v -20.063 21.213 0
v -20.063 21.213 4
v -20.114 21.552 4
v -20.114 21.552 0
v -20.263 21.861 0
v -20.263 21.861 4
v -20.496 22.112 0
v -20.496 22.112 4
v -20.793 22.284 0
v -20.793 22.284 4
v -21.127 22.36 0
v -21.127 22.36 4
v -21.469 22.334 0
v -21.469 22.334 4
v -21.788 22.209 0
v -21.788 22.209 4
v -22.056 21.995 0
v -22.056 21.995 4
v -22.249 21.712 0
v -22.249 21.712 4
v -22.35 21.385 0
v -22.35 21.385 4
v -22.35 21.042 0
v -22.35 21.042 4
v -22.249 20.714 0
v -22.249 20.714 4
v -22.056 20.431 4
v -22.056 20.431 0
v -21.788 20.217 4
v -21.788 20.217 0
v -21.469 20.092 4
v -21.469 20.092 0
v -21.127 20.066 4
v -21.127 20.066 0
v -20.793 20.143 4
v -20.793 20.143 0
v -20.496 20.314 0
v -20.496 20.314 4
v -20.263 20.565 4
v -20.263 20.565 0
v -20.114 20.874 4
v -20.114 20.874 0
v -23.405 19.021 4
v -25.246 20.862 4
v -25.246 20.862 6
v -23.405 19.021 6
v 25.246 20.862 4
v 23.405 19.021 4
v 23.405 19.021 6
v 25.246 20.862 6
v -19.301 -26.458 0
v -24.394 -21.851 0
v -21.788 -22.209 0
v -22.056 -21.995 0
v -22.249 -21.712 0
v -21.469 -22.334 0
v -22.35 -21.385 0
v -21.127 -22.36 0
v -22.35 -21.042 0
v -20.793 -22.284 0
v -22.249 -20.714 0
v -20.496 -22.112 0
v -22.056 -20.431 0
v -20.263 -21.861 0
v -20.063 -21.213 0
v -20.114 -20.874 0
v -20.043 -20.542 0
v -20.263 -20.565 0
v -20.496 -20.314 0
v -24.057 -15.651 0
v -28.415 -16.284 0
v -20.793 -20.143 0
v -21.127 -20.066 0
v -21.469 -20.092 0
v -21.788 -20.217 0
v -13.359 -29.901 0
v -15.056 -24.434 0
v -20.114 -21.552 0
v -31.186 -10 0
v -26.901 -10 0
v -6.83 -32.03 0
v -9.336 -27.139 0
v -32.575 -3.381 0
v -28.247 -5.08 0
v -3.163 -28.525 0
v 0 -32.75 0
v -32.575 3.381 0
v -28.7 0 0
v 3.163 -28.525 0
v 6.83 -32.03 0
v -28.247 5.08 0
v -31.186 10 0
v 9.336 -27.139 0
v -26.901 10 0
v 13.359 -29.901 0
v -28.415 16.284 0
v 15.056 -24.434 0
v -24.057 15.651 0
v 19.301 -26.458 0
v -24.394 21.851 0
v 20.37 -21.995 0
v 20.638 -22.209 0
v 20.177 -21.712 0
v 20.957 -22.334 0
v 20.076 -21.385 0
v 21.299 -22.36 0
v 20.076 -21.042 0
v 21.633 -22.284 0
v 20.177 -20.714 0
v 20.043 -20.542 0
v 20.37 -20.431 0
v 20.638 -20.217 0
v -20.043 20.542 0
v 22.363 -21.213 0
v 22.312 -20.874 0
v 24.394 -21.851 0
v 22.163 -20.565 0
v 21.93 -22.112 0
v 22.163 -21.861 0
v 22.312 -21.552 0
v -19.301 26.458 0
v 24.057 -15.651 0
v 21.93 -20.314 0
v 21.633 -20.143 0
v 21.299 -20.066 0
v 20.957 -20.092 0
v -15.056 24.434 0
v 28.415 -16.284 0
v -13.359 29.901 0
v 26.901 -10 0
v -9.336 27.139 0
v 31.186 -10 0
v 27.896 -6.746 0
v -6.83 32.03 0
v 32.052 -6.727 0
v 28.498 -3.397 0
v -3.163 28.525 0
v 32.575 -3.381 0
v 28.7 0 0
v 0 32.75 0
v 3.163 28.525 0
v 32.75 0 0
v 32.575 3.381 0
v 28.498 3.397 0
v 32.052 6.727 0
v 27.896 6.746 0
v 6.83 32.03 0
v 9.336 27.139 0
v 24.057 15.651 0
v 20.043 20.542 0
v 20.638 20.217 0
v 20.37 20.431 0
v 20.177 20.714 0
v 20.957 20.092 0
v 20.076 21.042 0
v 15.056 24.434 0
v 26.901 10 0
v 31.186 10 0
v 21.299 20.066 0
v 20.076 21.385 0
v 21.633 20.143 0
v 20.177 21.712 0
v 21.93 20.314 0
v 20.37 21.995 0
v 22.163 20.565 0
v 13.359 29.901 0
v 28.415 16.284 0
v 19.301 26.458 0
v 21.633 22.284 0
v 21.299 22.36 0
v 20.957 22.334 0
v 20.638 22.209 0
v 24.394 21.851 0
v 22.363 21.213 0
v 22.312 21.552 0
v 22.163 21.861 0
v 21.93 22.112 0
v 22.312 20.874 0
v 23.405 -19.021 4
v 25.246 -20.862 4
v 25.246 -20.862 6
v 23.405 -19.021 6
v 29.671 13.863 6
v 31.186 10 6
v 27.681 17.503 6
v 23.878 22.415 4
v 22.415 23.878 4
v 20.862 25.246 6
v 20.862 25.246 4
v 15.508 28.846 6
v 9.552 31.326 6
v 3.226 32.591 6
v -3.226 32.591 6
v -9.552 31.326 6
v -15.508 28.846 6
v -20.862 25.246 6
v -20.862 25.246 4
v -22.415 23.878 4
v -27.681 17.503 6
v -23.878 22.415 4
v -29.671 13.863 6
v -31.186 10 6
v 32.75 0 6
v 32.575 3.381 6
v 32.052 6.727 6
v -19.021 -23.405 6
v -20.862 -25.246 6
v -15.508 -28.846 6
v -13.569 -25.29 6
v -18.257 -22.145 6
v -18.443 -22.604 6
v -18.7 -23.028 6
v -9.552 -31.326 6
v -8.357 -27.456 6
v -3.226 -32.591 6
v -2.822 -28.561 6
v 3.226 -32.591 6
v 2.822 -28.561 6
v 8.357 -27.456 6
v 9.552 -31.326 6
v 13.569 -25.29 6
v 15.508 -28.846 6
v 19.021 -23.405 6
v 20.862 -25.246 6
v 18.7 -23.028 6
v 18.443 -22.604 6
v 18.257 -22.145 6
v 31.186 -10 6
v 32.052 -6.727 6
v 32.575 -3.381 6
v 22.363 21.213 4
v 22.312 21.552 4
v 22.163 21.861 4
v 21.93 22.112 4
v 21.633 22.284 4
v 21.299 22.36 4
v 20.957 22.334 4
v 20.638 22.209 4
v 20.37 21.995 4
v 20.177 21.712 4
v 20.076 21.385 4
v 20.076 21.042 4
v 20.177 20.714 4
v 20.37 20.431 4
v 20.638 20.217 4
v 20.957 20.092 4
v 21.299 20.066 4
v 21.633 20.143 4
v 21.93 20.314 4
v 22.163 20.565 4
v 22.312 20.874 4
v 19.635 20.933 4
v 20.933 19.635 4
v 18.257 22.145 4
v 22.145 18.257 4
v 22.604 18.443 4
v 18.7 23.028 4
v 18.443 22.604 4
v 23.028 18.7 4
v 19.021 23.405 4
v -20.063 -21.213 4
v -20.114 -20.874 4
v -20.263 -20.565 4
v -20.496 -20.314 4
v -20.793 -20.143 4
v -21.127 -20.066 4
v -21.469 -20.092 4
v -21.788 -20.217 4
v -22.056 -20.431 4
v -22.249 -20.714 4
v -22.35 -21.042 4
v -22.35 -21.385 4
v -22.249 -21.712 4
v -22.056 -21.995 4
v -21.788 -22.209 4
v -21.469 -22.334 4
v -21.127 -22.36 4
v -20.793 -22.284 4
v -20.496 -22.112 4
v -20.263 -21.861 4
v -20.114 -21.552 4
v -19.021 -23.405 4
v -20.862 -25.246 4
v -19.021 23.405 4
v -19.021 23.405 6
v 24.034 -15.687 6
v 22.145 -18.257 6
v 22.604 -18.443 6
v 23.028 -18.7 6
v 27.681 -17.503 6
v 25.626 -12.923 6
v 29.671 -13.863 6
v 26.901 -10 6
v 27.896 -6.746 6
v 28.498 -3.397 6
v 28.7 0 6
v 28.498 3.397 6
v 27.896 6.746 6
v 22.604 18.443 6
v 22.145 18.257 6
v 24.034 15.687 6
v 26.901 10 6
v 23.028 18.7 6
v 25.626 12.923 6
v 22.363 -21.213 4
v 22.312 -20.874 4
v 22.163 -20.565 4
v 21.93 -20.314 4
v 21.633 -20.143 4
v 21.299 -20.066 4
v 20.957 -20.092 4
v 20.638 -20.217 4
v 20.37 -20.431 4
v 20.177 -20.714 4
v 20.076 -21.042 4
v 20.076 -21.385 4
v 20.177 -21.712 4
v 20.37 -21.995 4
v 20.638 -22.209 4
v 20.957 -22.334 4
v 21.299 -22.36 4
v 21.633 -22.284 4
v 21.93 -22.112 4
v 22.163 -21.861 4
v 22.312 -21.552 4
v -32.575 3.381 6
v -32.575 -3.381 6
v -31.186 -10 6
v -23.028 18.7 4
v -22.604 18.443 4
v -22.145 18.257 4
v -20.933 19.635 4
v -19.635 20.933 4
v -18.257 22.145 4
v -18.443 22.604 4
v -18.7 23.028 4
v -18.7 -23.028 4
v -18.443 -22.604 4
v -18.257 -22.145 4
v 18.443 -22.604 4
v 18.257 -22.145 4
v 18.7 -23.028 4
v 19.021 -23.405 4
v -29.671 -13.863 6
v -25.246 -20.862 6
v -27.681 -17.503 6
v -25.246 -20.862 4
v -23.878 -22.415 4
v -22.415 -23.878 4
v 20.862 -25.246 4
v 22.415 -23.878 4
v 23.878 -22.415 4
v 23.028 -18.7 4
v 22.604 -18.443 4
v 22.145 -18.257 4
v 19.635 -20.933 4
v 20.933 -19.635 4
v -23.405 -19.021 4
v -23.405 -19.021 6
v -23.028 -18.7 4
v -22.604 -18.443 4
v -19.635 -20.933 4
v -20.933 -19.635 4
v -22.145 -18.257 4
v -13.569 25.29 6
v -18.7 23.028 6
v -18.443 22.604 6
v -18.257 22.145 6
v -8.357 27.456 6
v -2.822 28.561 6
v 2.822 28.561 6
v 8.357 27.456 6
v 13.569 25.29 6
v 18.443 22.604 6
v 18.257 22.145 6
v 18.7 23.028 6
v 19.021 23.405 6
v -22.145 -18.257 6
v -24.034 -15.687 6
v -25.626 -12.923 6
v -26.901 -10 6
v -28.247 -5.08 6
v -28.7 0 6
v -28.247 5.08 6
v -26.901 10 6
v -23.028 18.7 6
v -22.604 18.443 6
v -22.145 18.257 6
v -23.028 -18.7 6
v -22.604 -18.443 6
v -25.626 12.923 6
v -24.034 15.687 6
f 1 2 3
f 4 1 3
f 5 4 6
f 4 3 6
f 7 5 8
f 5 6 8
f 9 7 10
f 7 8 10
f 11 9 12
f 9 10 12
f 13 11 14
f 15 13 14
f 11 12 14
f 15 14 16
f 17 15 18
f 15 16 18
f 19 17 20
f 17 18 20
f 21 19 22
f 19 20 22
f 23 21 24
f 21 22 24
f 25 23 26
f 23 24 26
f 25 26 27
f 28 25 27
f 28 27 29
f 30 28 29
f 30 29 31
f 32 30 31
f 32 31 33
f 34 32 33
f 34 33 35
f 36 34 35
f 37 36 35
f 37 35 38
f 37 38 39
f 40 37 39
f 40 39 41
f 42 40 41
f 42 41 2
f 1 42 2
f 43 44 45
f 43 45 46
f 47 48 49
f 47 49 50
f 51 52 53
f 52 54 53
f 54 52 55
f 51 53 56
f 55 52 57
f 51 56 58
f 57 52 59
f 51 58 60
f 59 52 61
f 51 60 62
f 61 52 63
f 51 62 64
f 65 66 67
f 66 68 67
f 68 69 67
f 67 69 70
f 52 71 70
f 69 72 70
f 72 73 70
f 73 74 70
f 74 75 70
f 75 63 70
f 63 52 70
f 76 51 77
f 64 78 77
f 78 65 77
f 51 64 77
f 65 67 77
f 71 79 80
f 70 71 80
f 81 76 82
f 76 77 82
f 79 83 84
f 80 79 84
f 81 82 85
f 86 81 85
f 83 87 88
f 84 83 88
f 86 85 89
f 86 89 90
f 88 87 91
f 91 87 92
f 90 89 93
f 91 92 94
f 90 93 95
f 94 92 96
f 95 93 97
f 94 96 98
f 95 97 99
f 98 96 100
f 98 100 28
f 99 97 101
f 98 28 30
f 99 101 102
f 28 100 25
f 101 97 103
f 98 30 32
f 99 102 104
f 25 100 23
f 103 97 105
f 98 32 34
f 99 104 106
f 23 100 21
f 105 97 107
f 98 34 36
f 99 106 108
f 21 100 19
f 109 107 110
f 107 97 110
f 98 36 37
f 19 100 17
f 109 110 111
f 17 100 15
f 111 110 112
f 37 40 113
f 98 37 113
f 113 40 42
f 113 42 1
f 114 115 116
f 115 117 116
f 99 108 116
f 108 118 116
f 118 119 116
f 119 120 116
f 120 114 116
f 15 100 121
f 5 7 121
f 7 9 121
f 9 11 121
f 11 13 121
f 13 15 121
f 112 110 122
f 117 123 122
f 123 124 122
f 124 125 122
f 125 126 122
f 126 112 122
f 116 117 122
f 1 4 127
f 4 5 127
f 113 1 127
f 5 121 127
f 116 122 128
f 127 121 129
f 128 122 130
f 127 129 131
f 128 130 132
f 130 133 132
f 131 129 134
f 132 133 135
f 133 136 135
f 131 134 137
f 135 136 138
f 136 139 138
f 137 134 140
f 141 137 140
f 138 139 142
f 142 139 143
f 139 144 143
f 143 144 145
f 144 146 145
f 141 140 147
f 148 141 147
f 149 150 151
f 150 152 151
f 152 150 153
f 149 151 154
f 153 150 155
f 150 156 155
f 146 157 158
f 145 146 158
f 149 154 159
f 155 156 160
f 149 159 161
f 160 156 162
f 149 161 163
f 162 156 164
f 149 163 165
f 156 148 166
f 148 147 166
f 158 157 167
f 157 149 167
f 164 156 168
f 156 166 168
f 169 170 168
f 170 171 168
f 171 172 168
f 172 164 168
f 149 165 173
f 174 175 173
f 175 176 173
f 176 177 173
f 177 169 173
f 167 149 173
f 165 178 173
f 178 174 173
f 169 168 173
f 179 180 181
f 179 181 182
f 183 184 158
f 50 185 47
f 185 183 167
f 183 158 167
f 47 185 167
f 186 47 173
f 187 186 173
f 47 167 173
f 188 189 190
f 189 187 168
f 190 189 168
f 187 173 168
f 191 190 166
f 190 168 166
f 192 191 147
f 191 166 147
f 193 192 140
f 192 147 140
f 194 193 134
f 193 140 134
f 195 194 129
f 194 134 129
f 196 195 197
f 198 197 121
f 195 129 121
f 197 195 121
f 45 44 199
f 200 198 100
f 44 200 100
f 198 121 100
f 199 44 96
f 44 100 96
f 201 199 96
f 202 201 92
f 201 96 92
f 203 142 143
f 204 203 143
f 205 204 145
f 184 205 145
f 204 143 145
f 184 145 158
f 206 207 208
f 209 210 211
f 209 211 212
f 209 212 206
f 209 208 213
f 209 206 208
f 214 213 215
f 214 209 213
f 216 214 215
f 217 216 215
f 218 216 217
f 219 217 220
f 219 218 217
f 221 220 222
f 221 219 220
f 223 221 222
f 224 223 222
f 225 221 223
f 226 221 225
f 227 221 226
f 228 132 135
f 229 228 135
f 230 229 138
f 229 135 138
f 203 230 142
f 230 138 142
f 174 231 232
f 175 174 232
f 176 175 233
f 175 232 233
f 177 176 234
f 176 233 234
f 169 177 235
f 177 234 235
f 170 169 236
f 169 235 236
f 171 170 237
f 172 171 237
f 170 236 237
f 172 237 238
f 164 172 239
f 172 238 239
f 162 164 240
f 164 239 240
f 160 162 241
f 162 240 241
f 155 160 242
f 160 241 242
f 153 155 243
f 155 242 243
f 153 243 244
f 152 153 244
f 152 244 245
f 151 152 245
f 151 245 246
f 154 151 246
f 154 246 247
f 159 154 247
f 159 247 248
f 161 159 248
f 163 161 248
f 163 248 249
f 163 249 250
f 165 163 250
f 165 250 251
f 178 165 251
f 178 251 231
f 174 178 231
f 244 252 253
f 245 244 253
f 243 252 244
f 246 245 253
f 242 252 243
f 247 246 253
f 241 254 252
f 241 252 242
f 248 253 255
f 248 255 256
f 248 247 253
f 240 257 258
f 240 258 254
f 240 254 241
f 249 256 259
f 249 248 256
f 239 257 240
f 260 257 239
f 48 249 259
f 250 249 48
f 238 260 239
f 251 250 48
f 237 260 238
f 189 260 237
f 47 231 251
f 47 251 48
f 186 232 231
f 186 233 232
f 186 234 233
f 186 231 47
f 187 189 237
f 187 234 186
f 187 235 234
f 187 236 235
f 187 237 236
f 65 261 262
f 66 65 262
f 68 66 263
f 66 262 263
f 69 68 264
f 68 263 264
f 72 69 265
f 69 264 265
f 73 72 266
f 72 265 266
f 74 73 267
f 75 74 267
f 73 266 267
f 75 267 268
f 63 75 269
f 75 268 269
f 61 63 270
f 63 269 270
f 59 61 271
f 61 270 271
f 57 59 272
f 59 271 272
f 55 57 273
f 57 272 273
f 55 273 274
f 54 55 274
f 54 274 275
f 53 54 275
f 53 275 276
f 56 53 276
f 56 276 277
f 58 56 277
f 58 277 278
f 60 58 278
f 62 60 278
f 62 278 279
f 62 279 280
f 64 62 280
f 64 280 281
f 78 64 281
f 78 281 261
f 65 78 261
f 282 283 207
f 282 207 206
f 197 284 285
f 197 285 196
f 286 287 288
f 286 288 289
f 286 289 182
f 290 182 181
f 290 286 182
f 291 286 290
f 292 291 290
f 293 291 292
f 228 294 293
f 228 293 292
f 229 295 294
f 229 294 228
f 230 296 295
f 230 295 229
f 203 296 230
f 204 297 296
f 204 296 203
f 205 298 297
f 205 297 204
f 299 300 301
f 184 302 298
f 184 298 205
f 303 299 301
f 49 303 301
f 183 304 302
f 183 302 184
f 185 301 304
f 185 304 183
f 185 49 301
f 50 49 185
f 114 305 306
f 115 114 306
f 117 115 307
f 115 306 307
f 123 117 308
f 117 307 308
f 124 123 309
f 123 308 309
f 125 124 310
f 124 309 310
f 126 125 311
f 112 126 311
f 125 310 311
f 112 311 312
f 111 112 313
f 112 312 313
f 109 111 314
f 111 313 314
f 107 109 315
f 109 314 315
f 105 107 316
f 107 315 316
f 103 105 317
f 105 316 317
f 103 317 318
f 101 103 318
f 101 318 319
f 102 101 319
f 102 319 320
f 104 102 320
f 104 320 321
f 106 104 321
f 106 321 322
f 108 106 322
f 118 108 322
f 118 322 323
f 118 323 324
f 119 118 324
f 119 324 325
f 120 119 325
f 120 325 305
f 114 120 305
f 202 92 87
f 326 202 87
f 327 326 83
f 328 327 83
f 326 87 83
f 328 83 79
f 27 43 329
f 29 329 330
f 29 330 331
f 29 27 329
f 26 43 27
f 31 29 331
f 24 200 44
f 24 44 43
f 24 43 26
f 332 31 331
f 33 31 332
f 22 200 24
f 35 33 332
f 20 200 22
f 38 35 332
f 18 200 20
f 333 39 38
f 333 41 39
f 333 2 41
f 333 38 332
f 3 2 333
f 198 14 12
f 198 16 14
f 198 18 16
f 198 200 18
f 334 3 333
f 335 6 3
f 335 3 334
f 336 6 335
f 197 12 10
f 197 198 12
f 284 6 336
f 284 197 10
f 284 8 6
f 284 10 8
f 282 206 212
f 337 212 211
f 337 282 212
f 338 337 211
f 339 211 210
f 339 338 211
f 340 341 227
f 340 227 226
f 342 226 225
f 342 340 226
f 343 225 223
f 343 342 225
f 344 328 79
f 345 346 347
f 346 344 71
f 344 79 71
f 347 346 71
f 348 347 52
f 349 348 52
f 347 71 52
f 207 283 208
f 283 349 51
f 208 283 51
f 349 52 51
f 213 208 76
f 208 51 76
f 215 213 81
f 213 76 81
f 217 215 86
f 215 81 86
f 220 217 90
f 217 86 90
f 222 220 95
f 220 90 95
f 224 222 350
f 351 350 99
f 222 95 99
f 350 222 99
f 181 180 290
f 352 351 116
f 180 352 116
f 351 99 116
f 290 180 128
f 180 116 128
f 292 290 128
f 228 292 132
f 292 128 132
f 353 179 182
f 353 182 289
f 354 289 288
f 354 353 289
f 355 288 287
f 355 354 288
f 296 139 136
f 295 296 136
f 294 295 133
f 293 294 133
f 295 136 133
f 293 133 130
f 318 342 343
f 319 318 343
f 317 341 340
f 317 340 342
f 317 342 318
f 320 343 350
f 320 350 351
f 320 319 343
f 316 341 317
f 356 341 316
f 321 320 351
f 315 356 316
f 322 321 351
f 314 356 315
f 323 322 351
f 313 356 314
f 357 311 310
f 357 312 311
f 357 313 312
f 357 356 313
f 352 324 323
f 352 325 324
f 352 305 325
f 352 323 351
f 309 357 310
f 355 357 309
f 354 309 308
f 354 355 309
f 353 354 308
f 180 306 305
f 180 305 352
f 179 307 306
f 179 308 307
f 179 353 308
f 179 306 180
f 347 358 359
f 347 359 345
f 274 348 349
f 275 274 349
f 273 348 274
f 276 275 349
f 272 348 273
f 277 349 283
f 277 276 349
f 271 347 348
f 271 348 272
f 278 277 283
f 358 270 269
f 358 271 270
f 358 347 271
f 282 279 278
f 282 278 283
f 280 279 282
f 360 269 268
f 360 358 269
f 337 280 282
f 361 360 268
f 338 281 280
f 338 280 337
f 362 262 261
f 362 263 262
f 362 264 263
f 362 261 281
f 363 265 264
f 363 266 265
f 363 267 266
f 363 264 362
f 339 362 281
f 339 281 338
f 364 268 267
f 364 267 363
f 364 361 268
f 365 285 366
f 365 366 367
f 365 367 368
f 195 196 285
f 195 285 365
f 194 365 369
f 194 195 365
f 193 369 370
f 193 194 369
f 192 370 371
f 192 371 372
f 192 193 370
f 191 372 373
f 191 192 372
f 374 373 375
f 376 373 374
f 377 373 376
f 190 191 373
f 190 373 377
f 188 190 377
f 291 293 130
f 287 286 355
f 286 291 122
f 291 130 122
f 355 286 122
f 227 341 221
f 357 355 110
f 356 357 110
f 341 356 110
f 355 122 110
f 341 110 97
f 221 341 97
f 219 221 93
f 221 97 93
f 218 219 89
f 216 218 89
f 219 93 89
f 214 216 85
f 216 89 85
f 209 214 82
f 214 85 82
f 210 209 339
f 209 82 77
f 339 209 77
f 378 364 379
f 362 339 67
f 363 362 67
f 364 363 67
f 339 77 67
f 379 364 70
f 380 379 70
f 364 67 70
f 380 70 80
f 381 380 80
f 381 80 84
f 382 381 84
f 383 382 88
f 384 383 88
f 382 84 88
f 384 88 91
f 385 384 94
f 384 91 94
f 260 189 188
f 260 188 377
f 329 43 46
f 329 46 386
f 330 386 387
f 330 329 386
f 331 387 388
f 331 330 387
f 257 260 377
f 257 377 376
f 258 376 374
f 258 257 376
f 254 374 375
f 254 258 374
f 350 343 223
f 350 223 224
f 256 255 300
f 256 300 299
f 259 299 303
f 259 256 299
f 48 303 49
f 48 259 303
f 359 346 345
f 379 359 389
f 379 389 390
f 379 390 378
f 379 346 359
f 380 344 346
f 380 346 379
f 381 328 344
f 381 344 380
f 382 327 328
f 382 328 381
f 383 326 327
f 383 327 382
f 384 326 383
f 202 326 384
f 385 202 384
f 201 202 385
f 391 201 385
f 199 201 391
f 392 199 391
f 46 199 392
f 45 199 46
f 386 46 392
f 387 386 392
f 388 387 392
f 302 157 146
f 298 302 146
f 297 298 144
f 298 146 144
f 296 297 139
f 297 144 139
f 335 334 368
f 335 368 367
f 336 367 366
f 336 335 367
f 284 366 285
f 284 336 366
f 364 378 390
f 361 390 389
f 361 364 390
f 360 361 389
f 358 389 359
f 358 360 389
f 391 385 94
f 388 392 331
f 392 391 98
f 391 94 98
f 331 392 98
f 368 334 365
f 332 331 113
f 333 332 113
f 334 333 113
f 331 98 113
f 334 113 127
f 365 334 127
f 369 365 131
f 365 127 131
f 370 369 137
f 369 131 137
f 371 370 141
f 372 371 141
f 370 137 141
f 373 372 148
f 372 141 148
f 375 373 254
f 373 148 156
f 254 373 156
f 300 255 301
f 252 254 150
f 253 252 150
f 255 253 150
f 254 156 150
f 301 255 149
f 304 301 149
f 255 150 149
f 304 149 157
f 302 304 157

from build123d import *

# Parameters (mm, degrees)
SKETCH1_R           = 32.75
SKETCH1_R_2         = 28.7
BOSS_EXTRUDE1_DEPTH = 6
CUT_EXTRUDE1_START  = -2
CUT_EXTRUDE1_DEPTH  = 4
SKETCH2_7_R         = 1.150000003
CUT_EXTRUDE3_DEPTH  = 10


with BuildPart() as part:
    # Sketch1 → Boss-Extrude1 (new body)
    with BuildSketch(Plane.XY):
        Circle(SKETCH1_R)
        Circle(SKETCH1_R_2, mode=Mode.SUBTRACT)
    extrude(amount=BOSS_EXTRUDE1_DEPTH)

    # Sketch2 → Cut-Extrude1 (cut)
    with BuildSketch(Plane.XY.offset(6).offset(CUT_EXTRUDE1_START)):
        with BuildLine():
            ThreePointArc((-20.861737651, 25.245799694), (-23.157747084, 23.157747084), (-25.245799694, 20.861737651))
            Line((-25.245799694, 20.861737651), (-23.40529254, 19.021230496))
            ThreePointArc((-23.40529254, 19.021230496), (-22.471587987, 18.380133477), (-21.369913272, 18.117222076))
            Line((-21.369913272, 18.117222076), (-21.855038092, 18.602346895))
            ThreePointArc((-21.855038092, 18.602346895), (-21.70970764, 18.771749897), (-21.563064144, 18.940017548))
            ThreePointArc((-21.563064144, 18.940017548), (-19.586915918, 19.586915918), (-18.940017548, 21.563064144))
            ThreePointArc((-18.940017548, 21.563064144), (-18.771749897, 21.70970764), (-18.602346895, 21.855038092))
            Line((-18.602346895, 21.855038092), (-18.117222076, 21.369913272))
            ThreePointArc((-18.117222076, 21.369913272), (-18.380133477, 22.471587987), (-19.021230496, 23.40529254))
            Line((-19.021230496, 23.40529254), (-20.861737651, 25.245799694))
        make_face()
        with BuildLine():
            Line((20.861737651, 25.245799694), (19.021230496, 23.40529254))
            ThreePointArc((19.0212305, 23.405292536), (18.380133483, 22.471587987), (18.117222082, 21.369913278))
            Line((18.117222082, 21.369913278), (18.602346895, 21.855038092))
            ThreePointArc((18.602346895, 21.855038092), (18.771749898, 21.709707639), (18.940017551, 21.563064142))
            ThreePointArc((18.940017551, 21.563064142), (19.58691592, 19.58691592), (21.563064142, 18.940017551))
            ThreePointArc((21.563064142, 18.940017551), (21.709707639, 18.771749898), (21.855038092, 18.602346895))
            Line((21.855038092, 18.602346895), (21.369913278, 18.117222082))
            ThreePointArc((21.369913278, 18.117222082), (22.471587987, 18.380133483), (23.405292536, 19.0212305))
            Line((23.40529254, 19.021230496), (25.245799694, 20.861737651))
            ThreePointArc((25.245799694, 20.861737651), (23.157747084, 23.157747084), (20.861737651, 25.245799694))
        make_face()
        with BuildLine():
            Line((-23.40529254, -19.021230496), (-25.245799694, -20.861737651))
            ThreePointArc((-25.245799694, -20.861737651), (-23.157747084, -23.157747084), (-20.861737651, -25.245799694))
            Line((-20.861737651, -25.245799694), (-19.021230496, -23.40529254))
            ThreePointArc((-19.021230492, -23.405292544), (-18.38013347, -22.471587986), (-18.11722207, -21.369913266))
            Line((-18.11722207, -21.369913266), (-18.602346895, -21.855038092))
            ThreePointArc((-18.602346895, -21.855038092), (-18.771749899, -21.709707638), (-18.940017553, -21.56306414))
            ThreePointArc((-18.940017553, -21.56306414), (-19.586915922, -19.586915922), (-21.56306414, -18.940017553))
            ThreePointArc((-21.56306414, -18.940017553), (-21.709707638, -18.7717499), (-21.855038092, -18.602346895))
            Line((-21.855038092, -18.602346895), (-21.369913266, -18.11722207))
            ThreePointArc((-21.369913266, -18.11722207), (-22.471587986, -18.38013347), (-23.405292544, -19.021230492))
        make_face()
        with BuildLine():
            Line((21.369913272, -18.117222076), (21.855038092, -18.602346895))
            ThreePointArc((21.855038092, -18.602346895), (21.709707639, -18.771749898), (21.563064142, -18.940017551))
            ThreePointArc((21.563064142, -18.940017551), (19.58691592, -19.58691592), (18.940017551, -21.563064142))
            ThreePointArc((18.940017551, -21.563064142), (18.771749898, -21.709707639), (18.602346895, -21.855038092))
            Line((18.602346895, -21.855038092), (18.117222076, -21.369913272))
            ThreePointArc((18.117222076, -21.369913272), (18.380133477, -22.471587987), (19.021230496, -23.40529254))
            Line((19.021230496, -23.40529254), (20.861737651, -25.245799694))
            ThreePointArc((20.861737651, -25.245799694), (23.157747084, -23.157747084), (25.245799694, -20.861737651))
            Line((25.245799694, -20.861737651), (23.40529254, -19.021230496))
            ThreePointArc((23.40529254, -19.021230496), (22.471587987, -18.380133477), (21.369913272, -18.117222076))
        make_face()
    extrude(amount=CUT_EXTRUDE1_DEPTH, mode=Mode.SUBTRACT)

    # Sketch2<7> → Cut-Extrude3 (cut)
    with BuildSketch(Plane.XY.offset(6)):
        with Locations((-21.213261518, 21.213261518)):
            Circle(SKETCH2_7_R)
        with Locations((21.213261518, 21.213261518)):
            Circle(SKETCH2_7_R)
        with Locations((21.213261518, -21.213261518)):
            Circle(SKETCH2_7_R)
        with Locations((-21.213261518, -21.213261518)):
            Circle(SKETCH2_7_R)
    extrude(amount=-CUT_EXTRUDE3_DEPTH, mode=Mode.SUBTRACT)


solid = part.part
